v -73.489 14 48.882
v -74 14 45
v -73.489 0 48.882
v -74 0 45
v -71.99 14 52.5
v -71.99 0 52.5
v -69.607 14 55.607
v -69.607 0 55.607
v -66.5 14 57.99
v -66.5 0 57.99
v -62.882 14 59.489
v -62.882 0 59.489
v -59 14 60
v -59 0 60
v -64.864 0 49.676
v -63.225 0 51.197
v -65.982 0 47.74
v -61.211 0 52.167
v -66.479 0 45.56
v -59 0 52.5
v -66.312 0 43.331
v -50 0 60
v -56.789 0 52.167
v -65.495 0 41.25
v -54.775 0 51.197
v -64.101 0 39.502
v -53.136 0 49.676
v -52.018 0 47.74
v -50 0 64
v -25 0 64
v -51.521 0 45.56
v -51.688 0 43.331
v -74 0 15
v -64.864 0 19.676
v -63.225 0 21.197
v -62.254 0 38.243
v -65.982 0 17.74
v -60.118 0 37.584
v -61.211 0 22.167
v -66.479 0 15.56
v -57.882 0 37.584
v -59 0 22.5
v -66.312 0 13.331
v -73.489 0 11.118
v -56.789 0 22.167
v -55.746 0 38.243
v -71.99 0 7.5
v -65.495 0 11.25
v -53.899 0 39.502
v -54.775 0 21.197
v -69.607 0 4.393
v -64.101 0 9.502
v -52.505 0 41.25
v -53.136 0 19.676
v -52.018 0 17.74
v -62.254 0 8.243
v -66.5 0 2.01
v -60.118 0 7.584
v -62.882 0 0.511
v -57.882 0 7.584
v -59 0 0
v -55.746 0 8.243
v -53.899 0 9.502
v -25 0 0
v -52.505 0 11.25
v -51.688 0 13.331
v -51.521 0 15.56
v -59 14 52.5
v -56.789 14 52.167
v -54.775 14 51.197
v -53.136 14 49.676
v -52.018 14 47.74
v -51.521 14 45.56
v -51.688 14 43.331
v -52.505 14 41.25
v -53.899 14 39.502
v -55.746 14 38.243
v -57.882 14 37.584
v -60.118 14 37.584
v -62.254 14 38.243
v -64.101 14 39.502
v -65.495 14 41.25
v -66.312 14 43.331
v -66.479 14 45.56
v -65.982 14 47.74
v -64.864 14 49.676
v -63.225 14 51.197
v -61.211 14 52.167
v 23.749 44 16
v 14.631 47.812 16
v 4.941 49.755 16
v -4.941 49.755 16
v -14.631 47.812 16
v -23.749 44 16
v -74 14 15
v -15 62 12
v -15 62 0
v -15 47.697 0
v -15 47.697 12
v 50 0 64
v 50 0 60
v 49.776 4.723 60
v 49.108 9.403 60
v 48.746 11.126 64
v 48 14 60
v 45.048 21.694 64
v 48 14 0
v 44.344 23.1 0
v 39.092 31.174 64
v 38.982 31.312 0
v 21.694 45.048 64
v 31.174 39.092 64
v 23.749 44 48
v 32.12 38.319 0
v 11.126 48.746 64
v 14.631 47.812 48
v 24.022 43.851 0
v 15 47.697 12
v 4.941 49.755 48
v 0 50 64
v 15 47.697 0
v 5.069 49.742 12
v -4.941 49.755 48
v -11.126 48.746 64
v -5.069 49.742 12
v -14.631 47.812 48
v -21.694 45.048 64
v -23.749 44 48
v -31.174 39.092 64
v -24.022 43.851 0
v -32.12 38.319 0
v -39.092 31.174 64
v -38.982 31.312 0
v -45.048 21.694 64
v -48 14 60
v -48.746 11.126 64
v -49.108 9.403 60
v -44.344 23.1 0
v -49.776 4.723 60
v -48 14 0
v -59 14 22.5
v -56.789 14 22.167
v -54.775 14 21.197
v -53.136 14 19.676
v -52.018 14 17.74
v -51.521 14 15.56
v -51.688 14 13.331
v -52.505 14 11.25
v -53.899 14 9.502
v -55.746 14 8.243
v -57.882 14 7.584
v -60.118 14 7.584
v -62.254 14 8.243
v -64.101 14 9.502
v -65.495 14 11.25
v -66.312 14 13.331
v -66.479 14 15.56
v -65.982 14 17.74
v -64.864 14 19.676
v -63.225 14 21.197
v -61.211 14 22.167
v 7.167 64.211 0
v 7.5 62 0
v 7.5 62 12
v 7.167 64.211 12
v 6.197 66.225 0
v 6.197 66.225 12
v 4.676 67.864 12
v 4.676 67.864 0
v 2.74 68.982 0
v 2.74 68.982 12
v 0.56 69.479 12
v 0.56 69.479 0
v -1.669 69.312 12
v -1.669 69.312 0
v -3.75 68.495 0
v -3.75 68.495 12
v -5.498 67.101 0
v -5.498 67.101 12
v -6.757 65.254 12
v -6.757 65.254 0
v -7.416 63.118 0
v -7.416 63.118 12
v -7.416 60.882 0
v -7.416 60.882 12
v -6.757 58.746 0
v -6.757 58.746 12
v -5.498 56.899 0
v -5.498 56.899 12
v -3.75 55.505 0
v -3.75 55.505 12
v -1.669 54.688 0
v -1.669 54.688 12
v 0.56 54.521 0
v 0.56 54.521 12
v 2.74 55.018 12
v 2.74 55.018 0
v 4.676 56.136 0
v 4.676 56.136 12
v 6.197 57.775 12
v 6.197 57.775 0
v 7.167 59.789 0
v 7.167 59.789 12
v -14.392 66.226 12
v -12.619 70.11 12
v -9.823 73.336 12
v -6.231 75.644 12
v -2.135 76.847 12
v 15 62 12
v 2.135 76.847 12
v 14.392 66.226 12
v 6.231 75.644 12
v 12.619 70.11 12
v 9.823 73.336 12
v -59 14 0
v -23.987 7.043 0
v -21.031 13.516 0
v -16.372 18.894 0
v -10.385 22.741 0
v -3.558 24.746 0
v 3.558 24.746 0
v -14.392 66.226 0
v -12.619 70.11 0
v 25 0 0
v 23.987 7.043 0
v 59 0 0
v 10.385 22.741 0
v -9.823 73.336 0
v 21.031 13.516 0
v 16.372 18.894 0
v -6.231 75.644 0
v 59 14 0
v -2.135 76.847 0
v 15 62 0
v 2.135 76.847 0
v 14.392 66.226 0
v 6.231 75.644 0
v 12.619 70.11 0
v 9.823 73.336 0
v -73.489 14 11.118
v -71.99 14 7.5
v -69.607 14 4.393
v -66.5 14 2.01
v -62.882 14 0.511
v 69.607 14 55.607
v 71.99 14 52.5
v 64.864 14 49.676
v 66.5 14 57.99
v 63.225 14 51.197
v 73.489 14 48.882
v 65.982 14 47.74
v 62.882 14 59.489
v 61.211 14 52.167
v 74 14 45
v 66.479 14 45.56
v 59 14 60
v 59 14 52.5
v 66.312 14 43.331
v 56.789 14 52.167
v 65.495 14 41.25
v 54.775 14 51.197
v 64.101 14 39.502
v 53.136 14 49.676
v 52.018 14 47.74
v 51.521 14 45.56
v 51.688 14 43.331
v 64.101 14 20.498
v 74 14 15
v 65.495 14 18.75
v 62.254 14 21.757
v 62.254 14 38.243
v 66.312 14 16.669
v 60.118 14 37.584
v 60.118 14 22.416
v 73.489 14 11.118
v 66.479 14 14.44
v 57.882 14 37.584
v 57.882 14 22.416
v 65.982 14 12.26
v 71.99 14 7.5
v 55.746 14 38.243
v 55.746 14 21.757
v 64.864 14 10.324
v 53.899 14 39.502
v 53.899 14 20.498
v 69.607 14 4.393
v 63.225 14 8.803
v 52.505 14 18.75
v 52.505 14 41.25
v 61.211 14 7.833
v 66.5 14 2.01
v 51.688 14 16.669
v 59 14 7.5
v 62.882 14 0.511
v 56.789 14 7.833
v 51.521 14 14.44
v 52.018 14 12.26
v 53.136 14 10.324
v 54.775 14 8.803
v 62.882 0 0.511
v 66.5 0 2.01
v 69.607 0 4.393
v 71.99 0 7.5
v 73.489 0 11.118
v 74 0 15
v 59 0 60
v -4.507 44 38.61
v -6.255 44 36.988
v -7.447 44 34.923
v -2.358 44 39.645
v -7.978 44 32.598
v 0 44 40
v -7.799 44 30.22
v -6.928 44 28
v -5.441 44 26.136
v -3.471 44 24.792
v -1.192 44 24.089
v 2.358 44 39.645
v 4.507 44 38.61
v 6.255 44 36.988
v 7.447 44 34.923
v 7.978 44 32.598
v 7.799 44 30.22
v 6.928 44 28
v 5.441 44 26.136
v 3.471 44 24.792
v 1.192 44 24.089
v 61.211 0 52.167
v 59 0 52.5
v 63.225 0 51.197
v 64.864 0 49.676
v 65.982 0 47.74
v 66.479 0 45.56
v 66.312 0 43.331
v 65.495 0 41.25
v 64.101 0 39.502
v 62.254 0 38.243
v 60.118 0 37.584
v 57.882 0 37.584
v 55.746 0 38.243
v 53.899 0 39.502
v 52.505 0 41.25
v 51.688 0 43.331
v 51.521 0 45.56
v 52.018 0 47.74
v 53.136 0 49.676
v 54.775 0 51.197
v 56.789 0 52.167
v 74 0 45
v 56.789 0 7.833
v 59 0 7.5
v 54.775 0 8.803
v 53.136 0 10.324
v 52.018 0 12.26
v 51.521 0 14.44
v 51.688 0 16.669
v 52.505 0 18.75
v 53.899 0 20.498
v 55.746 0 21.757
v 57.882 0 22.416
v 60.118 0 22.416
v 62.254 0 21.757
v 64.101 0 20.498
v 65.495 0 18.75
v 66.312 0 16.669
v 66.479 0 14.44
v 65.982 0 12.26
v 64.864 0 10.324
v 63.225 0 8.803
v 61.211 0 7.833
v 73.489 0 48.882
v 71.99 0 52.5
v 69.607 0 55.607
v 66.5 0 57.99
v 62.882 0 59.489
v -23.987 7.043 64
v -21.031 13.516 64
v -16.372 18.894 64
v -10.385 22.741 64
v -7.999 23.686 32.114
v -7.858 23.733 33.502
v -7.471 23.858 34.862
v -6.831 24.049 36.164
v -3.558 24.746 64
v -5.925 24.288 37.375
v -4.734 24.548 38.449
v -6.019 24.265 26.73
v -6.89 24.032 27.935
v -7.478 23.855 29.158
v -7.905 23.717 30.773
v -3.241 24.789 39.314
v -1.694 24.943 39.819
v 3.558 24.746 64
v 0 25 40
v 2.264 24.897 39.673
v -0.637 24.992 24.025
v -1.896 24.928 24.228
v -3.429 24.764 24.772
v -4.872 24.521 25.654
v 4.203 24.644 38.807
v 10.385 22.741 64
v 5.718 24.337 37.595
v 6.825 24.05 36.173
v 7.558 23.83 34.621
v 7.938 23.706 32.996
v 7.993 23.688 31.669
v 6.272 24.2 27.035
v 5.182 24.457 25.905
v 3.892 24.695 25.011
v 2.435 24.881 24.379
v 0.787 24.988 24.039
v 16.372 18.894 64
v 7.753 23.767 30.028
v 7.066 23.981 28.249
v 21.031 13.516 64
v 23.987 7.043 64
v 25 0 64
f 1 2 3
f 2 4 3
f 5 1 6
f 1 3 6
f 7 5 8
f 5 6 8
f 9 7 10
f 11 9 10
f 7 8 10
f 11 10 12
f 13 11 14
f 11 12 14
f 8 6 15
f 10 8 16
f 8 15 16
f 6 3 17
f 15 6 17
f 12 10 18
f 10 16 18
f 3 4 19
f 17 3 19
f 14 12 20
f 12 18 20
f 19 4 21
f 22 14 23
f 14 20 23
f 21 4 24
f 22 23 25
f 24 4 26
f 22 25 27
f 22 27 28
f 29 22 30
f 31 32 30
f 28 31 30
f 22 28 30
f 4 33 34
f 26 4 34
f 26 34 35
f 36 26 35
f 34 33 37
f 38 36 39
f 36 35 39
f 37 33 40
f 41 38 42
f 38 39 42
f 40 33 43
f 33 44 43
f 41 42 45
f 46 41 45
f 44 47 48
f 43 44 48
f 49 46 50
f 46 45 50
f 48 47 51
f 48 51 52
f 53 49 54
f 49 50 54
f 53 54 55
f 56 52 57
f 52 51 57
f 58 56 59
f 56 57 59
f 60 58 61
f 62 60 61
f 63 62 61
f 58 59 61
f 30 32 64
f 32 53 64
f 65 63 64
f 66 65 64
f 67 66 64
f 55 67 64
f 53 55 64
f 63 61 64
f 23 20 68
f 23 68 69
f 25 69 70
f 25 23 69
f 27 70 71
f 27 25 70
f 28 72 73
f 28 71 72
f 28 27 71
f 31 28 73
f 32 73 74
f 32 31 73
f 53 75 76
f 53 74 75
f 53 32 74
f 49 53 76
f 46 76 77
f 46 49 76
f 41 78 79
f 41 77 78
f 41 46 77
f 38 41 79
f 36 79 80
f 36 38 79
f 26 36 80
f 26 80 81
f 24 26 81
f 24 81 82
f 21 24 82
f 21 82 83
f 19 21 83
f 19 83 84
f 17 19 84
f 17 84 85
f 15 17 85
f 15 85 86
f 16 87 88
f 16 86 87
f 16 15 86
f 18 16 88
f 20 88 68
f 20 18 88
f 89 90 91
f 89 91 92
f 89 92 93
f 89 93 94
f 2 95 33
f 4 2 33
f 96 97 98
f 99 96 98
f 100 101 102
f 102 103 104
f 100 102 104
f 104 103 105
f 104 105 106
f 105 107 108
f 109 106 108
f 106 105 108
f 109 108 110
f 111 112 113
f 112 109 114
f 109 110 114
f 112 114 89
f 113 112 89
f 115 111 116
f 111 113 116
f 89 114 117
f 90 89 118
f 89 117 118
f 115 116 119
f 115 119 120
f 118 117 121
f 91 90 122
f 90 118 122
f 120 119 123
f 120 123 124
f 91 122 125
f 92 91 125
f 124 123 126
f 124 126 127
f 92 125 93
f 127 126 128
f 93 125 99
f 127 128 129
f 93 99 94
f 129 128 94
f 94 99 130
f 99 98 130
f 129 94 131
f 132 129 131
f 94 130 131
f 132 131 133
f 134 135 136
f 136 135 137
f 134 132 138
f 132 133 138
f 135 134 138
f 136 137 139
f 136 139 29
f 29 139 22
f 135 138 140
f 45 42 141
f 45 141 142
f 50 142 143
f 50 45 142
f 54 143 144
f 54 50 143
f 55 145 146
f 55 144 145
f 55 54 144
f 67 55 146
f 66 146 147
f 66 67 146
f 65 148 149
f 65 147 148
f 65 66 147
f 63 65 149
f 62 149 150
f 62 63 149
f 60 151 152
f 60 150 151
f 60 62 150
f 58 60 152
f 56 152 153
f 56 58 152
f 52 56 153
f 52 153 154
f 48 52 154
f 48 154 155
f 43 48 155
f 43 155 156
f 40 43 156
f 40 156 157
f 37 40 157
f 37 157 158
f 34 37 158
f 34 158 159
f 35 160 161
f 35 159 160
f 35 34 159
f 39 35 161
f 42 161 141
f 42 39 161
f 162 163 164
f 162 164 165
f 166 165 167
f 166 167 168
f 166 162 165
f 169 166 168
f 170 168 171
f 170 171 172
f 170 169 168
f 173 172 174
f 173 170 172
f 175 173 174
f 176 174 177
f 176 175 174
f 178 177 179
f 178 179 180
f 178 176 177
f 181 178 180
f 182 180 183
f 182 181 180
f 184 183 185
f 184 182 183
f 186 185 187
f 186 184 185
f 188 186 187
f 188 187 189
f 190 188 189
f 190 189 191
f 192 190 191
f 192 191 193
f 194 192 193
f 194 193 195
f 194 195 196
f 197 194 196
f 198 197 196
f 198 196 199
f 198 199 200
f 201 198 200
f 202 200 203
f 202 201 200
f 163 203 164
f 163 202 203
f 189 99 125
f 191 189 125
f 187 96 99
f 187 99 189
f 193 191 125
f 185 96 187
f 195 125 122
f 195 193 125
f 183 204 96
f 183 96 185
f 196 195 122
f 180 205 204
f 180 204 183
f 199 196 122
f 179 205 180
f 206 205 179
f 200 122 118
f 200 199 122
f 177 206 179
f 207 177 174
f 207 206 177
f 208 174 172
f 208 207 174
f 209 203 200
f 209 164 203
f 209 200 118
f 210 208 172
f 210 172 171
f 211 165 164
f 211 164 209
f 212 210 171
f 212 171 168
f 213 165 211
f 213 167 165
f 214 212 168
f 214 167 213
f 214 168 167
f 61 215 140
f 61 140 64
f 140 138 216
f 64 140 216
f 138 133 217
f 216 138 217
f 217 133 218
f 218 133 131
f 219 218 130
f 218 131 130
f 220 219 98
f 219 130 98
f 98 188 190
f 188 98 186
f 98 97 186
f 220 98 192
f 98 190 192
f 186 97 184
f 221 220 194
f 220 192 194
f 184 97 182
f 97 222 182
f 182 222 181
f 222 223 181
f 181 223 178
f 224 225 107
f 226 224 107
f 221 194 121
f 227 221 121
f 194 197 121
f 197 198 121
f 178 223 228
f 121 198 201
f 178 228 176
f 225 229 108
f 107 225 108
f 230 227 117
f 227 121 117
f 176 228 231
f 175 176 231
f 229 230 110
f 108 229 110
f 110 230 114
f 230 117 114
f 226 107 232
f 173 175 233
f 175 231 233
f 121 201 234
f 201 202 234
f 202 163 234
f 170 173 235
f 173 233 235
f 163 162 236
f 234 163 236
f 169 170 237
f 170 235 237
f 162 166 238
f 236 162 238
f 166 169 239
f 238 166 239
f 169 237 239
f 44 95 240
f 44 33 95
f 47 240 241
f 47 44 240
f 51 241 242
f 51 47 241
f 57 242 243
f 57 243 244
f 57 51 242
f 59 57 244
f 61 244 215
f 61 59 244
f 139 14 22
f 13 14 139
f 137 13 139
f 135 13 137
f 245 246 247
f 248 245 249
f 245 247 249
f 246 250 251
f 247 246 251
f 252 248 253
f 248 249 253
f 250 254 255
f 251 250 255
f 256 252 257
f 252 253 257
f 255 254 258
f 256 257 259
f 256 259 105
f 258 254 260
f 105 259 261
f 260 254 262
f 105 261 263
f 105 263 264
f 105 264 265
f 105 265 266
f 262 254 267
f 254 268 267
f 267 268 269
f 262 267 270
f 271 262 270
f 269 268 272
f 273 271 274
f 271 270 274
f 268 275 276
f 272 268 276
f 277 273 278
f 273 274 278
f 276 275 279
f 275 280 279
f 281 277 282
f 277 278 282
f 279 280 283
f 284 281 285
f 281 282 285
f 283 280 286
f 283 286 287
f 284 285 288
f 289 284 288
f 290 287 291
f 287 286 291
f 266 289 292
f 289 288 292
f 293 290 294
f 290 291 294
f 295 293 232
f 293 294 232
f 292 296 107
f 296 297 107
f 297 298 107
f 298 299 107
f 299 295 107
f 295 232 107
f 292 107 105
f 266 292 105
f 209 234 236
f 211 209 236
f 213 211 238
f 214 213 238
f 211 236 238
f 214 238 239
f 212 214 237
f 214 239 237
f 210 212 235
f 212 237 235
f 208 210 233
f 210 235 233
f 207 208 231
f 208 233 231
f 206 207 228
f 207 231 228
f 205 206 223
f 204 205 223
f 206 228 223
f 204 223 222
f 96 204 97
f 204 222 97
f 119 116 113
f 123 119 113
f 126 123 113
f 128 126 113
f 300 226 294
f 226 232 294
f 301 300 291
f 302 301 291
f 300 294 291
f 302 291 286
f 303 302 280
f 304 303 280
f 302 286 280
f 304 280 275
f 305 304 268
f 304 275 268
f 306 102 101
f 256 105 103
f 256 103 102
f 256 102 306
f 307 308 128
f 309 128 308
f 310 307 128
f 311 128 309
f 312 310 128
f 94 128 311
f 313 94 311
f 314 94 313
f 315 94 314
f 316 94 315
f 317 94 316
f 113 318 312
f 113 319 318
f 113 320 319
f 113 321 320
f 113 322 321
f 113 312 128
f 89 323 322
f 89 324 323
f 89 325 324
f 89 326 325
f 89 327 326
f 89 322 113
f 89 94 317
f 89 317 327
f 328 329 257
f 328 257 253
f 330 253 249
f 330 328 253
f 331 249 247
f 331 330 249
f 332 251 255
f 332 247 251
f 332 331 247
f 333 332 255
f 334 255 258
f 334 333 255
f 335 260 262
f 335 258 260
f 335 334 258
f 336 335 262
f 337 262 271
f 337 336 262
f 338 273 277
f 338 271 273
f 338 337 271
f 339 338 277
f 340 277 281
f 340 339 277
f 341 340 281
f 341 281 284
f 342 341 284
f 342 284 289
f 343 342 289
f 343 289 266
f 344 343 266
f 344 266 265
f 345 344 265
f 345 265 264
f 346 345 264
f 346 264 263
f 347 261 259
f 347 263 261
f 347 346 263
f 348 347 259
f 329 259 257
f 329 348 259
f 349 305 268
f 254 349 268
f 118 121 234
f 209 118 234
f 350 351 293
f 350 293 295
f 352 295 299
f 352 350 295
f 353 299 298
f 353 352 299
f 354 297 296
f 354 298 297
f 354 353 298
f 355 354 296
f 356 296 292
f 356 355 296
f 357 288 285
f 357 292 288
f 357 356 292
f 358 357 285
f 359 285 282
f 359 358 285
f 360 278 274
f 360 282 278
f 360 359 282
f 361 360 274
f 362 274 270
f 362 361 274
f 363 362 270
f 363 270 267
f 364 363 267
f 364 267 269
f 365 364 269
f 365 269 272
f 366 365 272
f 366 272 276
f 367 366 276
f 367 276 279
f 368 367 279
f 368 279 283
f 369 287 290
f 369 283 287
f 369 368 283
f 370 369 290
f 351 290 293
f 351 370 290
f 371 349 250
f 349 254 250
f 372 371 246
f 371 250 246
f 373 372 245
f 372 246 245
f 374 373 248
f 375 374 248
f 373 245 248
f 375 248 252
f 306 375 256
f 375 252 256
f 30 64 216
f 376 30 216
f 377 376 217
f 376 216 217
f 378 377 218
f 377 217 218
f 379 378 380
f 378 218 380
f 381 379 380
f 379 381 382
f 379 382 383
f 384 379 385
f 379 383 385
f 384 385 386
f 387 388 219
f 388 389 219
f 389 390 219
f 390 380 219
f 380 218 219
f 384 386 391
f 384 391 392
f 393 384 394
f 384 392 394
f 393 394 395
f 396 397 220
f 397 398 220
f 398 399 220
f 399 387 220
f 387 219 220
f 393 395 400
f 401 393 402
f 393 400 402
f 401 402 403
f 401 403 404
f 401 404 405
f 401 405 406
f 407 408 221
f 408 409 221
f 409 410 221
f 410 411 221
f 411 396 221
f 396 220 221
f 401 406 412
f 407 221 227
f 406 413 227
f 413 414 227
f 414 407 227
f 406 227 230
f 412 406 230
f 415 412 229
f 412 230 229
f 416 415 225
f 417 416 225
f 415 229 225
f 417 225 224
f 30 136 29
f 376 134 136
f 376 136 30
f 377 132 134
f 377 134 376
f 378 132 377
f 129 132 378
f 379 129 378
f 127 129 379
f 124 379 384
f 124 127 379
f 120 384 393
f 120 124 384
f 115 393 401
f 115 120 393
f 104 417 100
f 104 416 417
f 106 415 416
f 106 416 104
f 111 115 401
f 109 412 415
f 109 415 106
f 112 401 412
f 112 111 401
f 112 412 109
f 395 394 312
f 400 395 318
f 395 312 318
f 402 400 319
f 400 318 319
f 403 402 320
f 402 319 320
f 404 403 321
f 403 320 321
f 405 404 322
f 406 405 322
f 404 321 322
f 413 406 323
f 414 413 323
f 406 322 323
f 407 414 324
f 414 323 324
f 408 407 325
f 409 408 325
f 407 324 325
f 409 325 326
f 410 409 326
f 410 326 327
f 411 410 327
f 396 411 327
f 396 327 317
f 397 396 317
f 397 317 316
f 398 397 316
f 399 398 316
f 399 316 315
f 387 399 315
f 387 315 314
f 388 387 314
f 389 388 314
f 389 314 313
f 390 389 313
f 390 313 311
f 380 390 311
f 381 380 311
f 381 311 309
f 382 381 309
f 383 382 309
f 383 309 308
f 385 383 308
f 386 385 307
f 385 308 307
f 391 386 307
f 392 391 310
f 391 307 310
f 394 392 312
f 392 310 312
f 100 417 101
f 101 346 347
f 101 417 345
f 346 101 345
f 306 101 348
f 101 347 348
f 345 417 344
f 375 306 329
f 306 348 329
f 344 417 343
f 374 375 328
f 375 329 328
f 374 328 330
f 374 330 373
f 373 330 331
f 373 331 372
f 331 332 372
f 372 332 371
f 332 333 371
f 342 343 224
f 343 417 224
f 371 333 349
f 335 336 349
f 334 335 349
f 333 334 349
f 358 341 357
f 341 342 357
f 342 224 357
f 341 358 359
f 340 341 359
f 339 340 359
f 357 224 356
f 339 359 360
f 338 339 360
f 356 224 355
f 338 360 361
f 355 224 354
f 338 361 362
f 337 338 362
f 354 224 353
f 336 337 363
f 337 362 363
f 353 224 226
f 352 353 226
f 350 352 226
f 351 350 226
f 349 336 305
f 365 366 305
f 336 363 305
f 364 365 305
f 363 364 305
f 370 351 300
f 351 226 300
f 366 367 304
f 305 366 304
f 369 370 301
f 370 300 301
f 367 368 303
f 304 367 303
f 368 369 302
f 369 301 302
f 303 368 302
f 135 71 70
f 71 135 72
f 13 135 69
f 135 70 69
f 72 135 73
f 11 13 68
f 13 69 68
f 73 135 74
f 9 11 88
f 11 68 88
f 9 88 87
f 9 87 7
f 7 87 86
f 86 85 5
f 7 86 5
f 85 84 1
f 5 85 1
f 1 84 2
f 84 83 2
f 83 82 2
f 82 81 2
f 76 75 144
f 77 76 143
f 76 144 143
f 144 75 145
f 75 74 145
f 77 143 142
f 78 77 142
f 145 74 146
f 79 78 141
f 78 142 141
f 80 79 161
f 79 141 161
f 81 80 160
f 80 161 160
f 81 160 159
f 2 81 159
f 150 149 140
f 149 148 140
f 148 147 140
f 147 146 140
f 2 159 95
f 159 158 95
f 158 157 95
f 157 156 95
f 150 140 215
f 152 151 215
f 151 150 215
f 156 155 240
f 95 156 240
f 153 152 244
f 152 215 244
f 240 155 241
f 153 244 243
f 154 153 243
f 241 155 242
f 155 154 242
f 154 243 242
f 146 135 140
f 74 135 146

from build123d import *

# Parameters (mm, degrees)
EXTRUDE_1_DEPTH          = 64
EXTRUDE_2_DEPTH          = 60
SKETCH_1_4_R             = 7.5
EXTRUDE_3_DEPTH          = 12
FILLET_1_R               = 15
CUT_EXTRUDE_1_DEPTH      = 117.365802537
CUT_EXTRUDE_1_DEPTH_BACK = 117.365802537
SKETCH_3_R               = 7.5
CUT_EXTRUDE_START        = -48
CUT_EXTRUDE_2_DEPTH      = 32
SKETCH_5_R               = 8
CUT_EXTRUDE_3_DEPTH      = 108.275346655


with BuildPart() as part:
    # 草图1 → 凸台-拉伸1 (new body)
    with BuildSketch(Plane.XY):
        with BuildLine():
            ThreePointArc((-48, 14), (-49.497474683, 7.071067812), (-50, 0))
            Line((-50, 0), (-25, 0))
            ThreePointArc((-25, 0), (0, 25), (25, 0))
            Line((25, 0), (50, 0))
            ThreePointArc((50, 0), (49.497474683, 7.071067812), (48, 14))
            ThreePointArc((48, 14), (35.722839746, 34.983978054), (15, 47.696960071))
            ThreePointArc((15, 47.696960071), (0, 50), (-15, 47.696960071))
            ThreePointArc((-15, 47.696960071), (-35.722839746, 34.983978054), (-48, 14))
        make_face()
    extrude(amount=EXTRUDE_1_DEPTH)

    # 草图1<3> → 凸台-拉伸2 (add)
    with BuildSketch(Plane.XY):
        with BuildLine():
            Line((-74, 14), (-74, 0))
            Line((-74, 0), (-50, 0))
            ThreePointArc((-50, 0), (-49.497474683, 7.071067812), (-48, 14))
            Line((-48, 14), (-74, 14))
        make_face()
        with BuildLine():
            ThreePointArc((48, 14), (49.497474683, 7.071067812), (50, 0))
            Line((50, 0), (74, 0))
            Line((74, 0), (74, 14))
            Line((74, 14), (48, 14))
        make_face()
    extrude(amount=EXTRUDE_2_DEPTH)

    # 草图1<4> → 凸台-拉伸3 (add)
    with BuildSketch(Plane.XY):
        with BuildLine():
            Line((-15, 62), (-15, 47.696960071))
            ThreePointArc((-15, 47.696960071), (0, 50), (15, 47.696960071))
            Line((15, 47.696960071), (15, 62))
            ThreePointArc((15, 62), (0, 77), (-15, 62))
        make_face()
        with Locations((0, 62)):
            Circle(SKETCH_1_4_R, mode=Mode.SUBTRACT)
    extrude(amount=EXTRUDE_3_DEPTH)

    # 圆角1
    fillet_1_edges = [part.edges().sort_by_distance(p)[0] for p in [
        (74, 7, 0),
        (74, 7, 60),
        (-74, 7, 60),
        (-74, 7, 0),
    ]]
    fillet(fillet_1_edges, radius=FILLET_1_R)

    # 草图3 → 切除-拉伸1 (cut, two sides: drawn at the far end of the back side and taken through both)
    with BuildSketch(Plane(origin=(0, 14, 0), x_dir=(1, 0, 0), z_dir=(0, 1, 0)).offset(-CUT_EXTRUDE_1_DEPTH_BACK)):
        with Locations((-59, -15)):
            Circle(SKETCH_3_R)
        with Locations((-59, -45)):
            Circle(SKETCH_3_R)
        with Locations((59, -15)):
            Circle(SKETCH_3_R)
        with Locations((59, -45)):
            Circle(SKETCH_3_R)
    extrude(amount=CUT_EXTRUDE_1_DEPTH + CUT_EXTRUDE_1_DEPTH_BACK, mode=Mode.SUBTRACT)

    # 草图4 → 切除-拉伸2 (cut)
    with BuildSketch(Plane.XY.offset(64).offset(CUT_EXTRUDE_START)):
        with BuildLine():
            Line((-23.748684174, 44), (23.748684174, 44))
            ThreePointArc((23.748684174, 44), (0, 50), (-23.748684174, 44))
        make_face()
    extrude(amount=CUT_EXTRUDE_2_DEPTH, mode=Mode.SUBTRACT)

    # 草图5 → 切除-拉伸3 (cut, through all)
    with BuildSketch(Plane(origin=(0, 44, 0), x_dir=(1, 0, 0), z_dir=(0, 1, 0))):
        with Locations((0, -32)):
            Circle(SKETCH_5_R)
    extrude(amount=-CUT_EXTRUDE_3_DEPTH, mode=Mode.SUBTRACT)


solid = part.part
